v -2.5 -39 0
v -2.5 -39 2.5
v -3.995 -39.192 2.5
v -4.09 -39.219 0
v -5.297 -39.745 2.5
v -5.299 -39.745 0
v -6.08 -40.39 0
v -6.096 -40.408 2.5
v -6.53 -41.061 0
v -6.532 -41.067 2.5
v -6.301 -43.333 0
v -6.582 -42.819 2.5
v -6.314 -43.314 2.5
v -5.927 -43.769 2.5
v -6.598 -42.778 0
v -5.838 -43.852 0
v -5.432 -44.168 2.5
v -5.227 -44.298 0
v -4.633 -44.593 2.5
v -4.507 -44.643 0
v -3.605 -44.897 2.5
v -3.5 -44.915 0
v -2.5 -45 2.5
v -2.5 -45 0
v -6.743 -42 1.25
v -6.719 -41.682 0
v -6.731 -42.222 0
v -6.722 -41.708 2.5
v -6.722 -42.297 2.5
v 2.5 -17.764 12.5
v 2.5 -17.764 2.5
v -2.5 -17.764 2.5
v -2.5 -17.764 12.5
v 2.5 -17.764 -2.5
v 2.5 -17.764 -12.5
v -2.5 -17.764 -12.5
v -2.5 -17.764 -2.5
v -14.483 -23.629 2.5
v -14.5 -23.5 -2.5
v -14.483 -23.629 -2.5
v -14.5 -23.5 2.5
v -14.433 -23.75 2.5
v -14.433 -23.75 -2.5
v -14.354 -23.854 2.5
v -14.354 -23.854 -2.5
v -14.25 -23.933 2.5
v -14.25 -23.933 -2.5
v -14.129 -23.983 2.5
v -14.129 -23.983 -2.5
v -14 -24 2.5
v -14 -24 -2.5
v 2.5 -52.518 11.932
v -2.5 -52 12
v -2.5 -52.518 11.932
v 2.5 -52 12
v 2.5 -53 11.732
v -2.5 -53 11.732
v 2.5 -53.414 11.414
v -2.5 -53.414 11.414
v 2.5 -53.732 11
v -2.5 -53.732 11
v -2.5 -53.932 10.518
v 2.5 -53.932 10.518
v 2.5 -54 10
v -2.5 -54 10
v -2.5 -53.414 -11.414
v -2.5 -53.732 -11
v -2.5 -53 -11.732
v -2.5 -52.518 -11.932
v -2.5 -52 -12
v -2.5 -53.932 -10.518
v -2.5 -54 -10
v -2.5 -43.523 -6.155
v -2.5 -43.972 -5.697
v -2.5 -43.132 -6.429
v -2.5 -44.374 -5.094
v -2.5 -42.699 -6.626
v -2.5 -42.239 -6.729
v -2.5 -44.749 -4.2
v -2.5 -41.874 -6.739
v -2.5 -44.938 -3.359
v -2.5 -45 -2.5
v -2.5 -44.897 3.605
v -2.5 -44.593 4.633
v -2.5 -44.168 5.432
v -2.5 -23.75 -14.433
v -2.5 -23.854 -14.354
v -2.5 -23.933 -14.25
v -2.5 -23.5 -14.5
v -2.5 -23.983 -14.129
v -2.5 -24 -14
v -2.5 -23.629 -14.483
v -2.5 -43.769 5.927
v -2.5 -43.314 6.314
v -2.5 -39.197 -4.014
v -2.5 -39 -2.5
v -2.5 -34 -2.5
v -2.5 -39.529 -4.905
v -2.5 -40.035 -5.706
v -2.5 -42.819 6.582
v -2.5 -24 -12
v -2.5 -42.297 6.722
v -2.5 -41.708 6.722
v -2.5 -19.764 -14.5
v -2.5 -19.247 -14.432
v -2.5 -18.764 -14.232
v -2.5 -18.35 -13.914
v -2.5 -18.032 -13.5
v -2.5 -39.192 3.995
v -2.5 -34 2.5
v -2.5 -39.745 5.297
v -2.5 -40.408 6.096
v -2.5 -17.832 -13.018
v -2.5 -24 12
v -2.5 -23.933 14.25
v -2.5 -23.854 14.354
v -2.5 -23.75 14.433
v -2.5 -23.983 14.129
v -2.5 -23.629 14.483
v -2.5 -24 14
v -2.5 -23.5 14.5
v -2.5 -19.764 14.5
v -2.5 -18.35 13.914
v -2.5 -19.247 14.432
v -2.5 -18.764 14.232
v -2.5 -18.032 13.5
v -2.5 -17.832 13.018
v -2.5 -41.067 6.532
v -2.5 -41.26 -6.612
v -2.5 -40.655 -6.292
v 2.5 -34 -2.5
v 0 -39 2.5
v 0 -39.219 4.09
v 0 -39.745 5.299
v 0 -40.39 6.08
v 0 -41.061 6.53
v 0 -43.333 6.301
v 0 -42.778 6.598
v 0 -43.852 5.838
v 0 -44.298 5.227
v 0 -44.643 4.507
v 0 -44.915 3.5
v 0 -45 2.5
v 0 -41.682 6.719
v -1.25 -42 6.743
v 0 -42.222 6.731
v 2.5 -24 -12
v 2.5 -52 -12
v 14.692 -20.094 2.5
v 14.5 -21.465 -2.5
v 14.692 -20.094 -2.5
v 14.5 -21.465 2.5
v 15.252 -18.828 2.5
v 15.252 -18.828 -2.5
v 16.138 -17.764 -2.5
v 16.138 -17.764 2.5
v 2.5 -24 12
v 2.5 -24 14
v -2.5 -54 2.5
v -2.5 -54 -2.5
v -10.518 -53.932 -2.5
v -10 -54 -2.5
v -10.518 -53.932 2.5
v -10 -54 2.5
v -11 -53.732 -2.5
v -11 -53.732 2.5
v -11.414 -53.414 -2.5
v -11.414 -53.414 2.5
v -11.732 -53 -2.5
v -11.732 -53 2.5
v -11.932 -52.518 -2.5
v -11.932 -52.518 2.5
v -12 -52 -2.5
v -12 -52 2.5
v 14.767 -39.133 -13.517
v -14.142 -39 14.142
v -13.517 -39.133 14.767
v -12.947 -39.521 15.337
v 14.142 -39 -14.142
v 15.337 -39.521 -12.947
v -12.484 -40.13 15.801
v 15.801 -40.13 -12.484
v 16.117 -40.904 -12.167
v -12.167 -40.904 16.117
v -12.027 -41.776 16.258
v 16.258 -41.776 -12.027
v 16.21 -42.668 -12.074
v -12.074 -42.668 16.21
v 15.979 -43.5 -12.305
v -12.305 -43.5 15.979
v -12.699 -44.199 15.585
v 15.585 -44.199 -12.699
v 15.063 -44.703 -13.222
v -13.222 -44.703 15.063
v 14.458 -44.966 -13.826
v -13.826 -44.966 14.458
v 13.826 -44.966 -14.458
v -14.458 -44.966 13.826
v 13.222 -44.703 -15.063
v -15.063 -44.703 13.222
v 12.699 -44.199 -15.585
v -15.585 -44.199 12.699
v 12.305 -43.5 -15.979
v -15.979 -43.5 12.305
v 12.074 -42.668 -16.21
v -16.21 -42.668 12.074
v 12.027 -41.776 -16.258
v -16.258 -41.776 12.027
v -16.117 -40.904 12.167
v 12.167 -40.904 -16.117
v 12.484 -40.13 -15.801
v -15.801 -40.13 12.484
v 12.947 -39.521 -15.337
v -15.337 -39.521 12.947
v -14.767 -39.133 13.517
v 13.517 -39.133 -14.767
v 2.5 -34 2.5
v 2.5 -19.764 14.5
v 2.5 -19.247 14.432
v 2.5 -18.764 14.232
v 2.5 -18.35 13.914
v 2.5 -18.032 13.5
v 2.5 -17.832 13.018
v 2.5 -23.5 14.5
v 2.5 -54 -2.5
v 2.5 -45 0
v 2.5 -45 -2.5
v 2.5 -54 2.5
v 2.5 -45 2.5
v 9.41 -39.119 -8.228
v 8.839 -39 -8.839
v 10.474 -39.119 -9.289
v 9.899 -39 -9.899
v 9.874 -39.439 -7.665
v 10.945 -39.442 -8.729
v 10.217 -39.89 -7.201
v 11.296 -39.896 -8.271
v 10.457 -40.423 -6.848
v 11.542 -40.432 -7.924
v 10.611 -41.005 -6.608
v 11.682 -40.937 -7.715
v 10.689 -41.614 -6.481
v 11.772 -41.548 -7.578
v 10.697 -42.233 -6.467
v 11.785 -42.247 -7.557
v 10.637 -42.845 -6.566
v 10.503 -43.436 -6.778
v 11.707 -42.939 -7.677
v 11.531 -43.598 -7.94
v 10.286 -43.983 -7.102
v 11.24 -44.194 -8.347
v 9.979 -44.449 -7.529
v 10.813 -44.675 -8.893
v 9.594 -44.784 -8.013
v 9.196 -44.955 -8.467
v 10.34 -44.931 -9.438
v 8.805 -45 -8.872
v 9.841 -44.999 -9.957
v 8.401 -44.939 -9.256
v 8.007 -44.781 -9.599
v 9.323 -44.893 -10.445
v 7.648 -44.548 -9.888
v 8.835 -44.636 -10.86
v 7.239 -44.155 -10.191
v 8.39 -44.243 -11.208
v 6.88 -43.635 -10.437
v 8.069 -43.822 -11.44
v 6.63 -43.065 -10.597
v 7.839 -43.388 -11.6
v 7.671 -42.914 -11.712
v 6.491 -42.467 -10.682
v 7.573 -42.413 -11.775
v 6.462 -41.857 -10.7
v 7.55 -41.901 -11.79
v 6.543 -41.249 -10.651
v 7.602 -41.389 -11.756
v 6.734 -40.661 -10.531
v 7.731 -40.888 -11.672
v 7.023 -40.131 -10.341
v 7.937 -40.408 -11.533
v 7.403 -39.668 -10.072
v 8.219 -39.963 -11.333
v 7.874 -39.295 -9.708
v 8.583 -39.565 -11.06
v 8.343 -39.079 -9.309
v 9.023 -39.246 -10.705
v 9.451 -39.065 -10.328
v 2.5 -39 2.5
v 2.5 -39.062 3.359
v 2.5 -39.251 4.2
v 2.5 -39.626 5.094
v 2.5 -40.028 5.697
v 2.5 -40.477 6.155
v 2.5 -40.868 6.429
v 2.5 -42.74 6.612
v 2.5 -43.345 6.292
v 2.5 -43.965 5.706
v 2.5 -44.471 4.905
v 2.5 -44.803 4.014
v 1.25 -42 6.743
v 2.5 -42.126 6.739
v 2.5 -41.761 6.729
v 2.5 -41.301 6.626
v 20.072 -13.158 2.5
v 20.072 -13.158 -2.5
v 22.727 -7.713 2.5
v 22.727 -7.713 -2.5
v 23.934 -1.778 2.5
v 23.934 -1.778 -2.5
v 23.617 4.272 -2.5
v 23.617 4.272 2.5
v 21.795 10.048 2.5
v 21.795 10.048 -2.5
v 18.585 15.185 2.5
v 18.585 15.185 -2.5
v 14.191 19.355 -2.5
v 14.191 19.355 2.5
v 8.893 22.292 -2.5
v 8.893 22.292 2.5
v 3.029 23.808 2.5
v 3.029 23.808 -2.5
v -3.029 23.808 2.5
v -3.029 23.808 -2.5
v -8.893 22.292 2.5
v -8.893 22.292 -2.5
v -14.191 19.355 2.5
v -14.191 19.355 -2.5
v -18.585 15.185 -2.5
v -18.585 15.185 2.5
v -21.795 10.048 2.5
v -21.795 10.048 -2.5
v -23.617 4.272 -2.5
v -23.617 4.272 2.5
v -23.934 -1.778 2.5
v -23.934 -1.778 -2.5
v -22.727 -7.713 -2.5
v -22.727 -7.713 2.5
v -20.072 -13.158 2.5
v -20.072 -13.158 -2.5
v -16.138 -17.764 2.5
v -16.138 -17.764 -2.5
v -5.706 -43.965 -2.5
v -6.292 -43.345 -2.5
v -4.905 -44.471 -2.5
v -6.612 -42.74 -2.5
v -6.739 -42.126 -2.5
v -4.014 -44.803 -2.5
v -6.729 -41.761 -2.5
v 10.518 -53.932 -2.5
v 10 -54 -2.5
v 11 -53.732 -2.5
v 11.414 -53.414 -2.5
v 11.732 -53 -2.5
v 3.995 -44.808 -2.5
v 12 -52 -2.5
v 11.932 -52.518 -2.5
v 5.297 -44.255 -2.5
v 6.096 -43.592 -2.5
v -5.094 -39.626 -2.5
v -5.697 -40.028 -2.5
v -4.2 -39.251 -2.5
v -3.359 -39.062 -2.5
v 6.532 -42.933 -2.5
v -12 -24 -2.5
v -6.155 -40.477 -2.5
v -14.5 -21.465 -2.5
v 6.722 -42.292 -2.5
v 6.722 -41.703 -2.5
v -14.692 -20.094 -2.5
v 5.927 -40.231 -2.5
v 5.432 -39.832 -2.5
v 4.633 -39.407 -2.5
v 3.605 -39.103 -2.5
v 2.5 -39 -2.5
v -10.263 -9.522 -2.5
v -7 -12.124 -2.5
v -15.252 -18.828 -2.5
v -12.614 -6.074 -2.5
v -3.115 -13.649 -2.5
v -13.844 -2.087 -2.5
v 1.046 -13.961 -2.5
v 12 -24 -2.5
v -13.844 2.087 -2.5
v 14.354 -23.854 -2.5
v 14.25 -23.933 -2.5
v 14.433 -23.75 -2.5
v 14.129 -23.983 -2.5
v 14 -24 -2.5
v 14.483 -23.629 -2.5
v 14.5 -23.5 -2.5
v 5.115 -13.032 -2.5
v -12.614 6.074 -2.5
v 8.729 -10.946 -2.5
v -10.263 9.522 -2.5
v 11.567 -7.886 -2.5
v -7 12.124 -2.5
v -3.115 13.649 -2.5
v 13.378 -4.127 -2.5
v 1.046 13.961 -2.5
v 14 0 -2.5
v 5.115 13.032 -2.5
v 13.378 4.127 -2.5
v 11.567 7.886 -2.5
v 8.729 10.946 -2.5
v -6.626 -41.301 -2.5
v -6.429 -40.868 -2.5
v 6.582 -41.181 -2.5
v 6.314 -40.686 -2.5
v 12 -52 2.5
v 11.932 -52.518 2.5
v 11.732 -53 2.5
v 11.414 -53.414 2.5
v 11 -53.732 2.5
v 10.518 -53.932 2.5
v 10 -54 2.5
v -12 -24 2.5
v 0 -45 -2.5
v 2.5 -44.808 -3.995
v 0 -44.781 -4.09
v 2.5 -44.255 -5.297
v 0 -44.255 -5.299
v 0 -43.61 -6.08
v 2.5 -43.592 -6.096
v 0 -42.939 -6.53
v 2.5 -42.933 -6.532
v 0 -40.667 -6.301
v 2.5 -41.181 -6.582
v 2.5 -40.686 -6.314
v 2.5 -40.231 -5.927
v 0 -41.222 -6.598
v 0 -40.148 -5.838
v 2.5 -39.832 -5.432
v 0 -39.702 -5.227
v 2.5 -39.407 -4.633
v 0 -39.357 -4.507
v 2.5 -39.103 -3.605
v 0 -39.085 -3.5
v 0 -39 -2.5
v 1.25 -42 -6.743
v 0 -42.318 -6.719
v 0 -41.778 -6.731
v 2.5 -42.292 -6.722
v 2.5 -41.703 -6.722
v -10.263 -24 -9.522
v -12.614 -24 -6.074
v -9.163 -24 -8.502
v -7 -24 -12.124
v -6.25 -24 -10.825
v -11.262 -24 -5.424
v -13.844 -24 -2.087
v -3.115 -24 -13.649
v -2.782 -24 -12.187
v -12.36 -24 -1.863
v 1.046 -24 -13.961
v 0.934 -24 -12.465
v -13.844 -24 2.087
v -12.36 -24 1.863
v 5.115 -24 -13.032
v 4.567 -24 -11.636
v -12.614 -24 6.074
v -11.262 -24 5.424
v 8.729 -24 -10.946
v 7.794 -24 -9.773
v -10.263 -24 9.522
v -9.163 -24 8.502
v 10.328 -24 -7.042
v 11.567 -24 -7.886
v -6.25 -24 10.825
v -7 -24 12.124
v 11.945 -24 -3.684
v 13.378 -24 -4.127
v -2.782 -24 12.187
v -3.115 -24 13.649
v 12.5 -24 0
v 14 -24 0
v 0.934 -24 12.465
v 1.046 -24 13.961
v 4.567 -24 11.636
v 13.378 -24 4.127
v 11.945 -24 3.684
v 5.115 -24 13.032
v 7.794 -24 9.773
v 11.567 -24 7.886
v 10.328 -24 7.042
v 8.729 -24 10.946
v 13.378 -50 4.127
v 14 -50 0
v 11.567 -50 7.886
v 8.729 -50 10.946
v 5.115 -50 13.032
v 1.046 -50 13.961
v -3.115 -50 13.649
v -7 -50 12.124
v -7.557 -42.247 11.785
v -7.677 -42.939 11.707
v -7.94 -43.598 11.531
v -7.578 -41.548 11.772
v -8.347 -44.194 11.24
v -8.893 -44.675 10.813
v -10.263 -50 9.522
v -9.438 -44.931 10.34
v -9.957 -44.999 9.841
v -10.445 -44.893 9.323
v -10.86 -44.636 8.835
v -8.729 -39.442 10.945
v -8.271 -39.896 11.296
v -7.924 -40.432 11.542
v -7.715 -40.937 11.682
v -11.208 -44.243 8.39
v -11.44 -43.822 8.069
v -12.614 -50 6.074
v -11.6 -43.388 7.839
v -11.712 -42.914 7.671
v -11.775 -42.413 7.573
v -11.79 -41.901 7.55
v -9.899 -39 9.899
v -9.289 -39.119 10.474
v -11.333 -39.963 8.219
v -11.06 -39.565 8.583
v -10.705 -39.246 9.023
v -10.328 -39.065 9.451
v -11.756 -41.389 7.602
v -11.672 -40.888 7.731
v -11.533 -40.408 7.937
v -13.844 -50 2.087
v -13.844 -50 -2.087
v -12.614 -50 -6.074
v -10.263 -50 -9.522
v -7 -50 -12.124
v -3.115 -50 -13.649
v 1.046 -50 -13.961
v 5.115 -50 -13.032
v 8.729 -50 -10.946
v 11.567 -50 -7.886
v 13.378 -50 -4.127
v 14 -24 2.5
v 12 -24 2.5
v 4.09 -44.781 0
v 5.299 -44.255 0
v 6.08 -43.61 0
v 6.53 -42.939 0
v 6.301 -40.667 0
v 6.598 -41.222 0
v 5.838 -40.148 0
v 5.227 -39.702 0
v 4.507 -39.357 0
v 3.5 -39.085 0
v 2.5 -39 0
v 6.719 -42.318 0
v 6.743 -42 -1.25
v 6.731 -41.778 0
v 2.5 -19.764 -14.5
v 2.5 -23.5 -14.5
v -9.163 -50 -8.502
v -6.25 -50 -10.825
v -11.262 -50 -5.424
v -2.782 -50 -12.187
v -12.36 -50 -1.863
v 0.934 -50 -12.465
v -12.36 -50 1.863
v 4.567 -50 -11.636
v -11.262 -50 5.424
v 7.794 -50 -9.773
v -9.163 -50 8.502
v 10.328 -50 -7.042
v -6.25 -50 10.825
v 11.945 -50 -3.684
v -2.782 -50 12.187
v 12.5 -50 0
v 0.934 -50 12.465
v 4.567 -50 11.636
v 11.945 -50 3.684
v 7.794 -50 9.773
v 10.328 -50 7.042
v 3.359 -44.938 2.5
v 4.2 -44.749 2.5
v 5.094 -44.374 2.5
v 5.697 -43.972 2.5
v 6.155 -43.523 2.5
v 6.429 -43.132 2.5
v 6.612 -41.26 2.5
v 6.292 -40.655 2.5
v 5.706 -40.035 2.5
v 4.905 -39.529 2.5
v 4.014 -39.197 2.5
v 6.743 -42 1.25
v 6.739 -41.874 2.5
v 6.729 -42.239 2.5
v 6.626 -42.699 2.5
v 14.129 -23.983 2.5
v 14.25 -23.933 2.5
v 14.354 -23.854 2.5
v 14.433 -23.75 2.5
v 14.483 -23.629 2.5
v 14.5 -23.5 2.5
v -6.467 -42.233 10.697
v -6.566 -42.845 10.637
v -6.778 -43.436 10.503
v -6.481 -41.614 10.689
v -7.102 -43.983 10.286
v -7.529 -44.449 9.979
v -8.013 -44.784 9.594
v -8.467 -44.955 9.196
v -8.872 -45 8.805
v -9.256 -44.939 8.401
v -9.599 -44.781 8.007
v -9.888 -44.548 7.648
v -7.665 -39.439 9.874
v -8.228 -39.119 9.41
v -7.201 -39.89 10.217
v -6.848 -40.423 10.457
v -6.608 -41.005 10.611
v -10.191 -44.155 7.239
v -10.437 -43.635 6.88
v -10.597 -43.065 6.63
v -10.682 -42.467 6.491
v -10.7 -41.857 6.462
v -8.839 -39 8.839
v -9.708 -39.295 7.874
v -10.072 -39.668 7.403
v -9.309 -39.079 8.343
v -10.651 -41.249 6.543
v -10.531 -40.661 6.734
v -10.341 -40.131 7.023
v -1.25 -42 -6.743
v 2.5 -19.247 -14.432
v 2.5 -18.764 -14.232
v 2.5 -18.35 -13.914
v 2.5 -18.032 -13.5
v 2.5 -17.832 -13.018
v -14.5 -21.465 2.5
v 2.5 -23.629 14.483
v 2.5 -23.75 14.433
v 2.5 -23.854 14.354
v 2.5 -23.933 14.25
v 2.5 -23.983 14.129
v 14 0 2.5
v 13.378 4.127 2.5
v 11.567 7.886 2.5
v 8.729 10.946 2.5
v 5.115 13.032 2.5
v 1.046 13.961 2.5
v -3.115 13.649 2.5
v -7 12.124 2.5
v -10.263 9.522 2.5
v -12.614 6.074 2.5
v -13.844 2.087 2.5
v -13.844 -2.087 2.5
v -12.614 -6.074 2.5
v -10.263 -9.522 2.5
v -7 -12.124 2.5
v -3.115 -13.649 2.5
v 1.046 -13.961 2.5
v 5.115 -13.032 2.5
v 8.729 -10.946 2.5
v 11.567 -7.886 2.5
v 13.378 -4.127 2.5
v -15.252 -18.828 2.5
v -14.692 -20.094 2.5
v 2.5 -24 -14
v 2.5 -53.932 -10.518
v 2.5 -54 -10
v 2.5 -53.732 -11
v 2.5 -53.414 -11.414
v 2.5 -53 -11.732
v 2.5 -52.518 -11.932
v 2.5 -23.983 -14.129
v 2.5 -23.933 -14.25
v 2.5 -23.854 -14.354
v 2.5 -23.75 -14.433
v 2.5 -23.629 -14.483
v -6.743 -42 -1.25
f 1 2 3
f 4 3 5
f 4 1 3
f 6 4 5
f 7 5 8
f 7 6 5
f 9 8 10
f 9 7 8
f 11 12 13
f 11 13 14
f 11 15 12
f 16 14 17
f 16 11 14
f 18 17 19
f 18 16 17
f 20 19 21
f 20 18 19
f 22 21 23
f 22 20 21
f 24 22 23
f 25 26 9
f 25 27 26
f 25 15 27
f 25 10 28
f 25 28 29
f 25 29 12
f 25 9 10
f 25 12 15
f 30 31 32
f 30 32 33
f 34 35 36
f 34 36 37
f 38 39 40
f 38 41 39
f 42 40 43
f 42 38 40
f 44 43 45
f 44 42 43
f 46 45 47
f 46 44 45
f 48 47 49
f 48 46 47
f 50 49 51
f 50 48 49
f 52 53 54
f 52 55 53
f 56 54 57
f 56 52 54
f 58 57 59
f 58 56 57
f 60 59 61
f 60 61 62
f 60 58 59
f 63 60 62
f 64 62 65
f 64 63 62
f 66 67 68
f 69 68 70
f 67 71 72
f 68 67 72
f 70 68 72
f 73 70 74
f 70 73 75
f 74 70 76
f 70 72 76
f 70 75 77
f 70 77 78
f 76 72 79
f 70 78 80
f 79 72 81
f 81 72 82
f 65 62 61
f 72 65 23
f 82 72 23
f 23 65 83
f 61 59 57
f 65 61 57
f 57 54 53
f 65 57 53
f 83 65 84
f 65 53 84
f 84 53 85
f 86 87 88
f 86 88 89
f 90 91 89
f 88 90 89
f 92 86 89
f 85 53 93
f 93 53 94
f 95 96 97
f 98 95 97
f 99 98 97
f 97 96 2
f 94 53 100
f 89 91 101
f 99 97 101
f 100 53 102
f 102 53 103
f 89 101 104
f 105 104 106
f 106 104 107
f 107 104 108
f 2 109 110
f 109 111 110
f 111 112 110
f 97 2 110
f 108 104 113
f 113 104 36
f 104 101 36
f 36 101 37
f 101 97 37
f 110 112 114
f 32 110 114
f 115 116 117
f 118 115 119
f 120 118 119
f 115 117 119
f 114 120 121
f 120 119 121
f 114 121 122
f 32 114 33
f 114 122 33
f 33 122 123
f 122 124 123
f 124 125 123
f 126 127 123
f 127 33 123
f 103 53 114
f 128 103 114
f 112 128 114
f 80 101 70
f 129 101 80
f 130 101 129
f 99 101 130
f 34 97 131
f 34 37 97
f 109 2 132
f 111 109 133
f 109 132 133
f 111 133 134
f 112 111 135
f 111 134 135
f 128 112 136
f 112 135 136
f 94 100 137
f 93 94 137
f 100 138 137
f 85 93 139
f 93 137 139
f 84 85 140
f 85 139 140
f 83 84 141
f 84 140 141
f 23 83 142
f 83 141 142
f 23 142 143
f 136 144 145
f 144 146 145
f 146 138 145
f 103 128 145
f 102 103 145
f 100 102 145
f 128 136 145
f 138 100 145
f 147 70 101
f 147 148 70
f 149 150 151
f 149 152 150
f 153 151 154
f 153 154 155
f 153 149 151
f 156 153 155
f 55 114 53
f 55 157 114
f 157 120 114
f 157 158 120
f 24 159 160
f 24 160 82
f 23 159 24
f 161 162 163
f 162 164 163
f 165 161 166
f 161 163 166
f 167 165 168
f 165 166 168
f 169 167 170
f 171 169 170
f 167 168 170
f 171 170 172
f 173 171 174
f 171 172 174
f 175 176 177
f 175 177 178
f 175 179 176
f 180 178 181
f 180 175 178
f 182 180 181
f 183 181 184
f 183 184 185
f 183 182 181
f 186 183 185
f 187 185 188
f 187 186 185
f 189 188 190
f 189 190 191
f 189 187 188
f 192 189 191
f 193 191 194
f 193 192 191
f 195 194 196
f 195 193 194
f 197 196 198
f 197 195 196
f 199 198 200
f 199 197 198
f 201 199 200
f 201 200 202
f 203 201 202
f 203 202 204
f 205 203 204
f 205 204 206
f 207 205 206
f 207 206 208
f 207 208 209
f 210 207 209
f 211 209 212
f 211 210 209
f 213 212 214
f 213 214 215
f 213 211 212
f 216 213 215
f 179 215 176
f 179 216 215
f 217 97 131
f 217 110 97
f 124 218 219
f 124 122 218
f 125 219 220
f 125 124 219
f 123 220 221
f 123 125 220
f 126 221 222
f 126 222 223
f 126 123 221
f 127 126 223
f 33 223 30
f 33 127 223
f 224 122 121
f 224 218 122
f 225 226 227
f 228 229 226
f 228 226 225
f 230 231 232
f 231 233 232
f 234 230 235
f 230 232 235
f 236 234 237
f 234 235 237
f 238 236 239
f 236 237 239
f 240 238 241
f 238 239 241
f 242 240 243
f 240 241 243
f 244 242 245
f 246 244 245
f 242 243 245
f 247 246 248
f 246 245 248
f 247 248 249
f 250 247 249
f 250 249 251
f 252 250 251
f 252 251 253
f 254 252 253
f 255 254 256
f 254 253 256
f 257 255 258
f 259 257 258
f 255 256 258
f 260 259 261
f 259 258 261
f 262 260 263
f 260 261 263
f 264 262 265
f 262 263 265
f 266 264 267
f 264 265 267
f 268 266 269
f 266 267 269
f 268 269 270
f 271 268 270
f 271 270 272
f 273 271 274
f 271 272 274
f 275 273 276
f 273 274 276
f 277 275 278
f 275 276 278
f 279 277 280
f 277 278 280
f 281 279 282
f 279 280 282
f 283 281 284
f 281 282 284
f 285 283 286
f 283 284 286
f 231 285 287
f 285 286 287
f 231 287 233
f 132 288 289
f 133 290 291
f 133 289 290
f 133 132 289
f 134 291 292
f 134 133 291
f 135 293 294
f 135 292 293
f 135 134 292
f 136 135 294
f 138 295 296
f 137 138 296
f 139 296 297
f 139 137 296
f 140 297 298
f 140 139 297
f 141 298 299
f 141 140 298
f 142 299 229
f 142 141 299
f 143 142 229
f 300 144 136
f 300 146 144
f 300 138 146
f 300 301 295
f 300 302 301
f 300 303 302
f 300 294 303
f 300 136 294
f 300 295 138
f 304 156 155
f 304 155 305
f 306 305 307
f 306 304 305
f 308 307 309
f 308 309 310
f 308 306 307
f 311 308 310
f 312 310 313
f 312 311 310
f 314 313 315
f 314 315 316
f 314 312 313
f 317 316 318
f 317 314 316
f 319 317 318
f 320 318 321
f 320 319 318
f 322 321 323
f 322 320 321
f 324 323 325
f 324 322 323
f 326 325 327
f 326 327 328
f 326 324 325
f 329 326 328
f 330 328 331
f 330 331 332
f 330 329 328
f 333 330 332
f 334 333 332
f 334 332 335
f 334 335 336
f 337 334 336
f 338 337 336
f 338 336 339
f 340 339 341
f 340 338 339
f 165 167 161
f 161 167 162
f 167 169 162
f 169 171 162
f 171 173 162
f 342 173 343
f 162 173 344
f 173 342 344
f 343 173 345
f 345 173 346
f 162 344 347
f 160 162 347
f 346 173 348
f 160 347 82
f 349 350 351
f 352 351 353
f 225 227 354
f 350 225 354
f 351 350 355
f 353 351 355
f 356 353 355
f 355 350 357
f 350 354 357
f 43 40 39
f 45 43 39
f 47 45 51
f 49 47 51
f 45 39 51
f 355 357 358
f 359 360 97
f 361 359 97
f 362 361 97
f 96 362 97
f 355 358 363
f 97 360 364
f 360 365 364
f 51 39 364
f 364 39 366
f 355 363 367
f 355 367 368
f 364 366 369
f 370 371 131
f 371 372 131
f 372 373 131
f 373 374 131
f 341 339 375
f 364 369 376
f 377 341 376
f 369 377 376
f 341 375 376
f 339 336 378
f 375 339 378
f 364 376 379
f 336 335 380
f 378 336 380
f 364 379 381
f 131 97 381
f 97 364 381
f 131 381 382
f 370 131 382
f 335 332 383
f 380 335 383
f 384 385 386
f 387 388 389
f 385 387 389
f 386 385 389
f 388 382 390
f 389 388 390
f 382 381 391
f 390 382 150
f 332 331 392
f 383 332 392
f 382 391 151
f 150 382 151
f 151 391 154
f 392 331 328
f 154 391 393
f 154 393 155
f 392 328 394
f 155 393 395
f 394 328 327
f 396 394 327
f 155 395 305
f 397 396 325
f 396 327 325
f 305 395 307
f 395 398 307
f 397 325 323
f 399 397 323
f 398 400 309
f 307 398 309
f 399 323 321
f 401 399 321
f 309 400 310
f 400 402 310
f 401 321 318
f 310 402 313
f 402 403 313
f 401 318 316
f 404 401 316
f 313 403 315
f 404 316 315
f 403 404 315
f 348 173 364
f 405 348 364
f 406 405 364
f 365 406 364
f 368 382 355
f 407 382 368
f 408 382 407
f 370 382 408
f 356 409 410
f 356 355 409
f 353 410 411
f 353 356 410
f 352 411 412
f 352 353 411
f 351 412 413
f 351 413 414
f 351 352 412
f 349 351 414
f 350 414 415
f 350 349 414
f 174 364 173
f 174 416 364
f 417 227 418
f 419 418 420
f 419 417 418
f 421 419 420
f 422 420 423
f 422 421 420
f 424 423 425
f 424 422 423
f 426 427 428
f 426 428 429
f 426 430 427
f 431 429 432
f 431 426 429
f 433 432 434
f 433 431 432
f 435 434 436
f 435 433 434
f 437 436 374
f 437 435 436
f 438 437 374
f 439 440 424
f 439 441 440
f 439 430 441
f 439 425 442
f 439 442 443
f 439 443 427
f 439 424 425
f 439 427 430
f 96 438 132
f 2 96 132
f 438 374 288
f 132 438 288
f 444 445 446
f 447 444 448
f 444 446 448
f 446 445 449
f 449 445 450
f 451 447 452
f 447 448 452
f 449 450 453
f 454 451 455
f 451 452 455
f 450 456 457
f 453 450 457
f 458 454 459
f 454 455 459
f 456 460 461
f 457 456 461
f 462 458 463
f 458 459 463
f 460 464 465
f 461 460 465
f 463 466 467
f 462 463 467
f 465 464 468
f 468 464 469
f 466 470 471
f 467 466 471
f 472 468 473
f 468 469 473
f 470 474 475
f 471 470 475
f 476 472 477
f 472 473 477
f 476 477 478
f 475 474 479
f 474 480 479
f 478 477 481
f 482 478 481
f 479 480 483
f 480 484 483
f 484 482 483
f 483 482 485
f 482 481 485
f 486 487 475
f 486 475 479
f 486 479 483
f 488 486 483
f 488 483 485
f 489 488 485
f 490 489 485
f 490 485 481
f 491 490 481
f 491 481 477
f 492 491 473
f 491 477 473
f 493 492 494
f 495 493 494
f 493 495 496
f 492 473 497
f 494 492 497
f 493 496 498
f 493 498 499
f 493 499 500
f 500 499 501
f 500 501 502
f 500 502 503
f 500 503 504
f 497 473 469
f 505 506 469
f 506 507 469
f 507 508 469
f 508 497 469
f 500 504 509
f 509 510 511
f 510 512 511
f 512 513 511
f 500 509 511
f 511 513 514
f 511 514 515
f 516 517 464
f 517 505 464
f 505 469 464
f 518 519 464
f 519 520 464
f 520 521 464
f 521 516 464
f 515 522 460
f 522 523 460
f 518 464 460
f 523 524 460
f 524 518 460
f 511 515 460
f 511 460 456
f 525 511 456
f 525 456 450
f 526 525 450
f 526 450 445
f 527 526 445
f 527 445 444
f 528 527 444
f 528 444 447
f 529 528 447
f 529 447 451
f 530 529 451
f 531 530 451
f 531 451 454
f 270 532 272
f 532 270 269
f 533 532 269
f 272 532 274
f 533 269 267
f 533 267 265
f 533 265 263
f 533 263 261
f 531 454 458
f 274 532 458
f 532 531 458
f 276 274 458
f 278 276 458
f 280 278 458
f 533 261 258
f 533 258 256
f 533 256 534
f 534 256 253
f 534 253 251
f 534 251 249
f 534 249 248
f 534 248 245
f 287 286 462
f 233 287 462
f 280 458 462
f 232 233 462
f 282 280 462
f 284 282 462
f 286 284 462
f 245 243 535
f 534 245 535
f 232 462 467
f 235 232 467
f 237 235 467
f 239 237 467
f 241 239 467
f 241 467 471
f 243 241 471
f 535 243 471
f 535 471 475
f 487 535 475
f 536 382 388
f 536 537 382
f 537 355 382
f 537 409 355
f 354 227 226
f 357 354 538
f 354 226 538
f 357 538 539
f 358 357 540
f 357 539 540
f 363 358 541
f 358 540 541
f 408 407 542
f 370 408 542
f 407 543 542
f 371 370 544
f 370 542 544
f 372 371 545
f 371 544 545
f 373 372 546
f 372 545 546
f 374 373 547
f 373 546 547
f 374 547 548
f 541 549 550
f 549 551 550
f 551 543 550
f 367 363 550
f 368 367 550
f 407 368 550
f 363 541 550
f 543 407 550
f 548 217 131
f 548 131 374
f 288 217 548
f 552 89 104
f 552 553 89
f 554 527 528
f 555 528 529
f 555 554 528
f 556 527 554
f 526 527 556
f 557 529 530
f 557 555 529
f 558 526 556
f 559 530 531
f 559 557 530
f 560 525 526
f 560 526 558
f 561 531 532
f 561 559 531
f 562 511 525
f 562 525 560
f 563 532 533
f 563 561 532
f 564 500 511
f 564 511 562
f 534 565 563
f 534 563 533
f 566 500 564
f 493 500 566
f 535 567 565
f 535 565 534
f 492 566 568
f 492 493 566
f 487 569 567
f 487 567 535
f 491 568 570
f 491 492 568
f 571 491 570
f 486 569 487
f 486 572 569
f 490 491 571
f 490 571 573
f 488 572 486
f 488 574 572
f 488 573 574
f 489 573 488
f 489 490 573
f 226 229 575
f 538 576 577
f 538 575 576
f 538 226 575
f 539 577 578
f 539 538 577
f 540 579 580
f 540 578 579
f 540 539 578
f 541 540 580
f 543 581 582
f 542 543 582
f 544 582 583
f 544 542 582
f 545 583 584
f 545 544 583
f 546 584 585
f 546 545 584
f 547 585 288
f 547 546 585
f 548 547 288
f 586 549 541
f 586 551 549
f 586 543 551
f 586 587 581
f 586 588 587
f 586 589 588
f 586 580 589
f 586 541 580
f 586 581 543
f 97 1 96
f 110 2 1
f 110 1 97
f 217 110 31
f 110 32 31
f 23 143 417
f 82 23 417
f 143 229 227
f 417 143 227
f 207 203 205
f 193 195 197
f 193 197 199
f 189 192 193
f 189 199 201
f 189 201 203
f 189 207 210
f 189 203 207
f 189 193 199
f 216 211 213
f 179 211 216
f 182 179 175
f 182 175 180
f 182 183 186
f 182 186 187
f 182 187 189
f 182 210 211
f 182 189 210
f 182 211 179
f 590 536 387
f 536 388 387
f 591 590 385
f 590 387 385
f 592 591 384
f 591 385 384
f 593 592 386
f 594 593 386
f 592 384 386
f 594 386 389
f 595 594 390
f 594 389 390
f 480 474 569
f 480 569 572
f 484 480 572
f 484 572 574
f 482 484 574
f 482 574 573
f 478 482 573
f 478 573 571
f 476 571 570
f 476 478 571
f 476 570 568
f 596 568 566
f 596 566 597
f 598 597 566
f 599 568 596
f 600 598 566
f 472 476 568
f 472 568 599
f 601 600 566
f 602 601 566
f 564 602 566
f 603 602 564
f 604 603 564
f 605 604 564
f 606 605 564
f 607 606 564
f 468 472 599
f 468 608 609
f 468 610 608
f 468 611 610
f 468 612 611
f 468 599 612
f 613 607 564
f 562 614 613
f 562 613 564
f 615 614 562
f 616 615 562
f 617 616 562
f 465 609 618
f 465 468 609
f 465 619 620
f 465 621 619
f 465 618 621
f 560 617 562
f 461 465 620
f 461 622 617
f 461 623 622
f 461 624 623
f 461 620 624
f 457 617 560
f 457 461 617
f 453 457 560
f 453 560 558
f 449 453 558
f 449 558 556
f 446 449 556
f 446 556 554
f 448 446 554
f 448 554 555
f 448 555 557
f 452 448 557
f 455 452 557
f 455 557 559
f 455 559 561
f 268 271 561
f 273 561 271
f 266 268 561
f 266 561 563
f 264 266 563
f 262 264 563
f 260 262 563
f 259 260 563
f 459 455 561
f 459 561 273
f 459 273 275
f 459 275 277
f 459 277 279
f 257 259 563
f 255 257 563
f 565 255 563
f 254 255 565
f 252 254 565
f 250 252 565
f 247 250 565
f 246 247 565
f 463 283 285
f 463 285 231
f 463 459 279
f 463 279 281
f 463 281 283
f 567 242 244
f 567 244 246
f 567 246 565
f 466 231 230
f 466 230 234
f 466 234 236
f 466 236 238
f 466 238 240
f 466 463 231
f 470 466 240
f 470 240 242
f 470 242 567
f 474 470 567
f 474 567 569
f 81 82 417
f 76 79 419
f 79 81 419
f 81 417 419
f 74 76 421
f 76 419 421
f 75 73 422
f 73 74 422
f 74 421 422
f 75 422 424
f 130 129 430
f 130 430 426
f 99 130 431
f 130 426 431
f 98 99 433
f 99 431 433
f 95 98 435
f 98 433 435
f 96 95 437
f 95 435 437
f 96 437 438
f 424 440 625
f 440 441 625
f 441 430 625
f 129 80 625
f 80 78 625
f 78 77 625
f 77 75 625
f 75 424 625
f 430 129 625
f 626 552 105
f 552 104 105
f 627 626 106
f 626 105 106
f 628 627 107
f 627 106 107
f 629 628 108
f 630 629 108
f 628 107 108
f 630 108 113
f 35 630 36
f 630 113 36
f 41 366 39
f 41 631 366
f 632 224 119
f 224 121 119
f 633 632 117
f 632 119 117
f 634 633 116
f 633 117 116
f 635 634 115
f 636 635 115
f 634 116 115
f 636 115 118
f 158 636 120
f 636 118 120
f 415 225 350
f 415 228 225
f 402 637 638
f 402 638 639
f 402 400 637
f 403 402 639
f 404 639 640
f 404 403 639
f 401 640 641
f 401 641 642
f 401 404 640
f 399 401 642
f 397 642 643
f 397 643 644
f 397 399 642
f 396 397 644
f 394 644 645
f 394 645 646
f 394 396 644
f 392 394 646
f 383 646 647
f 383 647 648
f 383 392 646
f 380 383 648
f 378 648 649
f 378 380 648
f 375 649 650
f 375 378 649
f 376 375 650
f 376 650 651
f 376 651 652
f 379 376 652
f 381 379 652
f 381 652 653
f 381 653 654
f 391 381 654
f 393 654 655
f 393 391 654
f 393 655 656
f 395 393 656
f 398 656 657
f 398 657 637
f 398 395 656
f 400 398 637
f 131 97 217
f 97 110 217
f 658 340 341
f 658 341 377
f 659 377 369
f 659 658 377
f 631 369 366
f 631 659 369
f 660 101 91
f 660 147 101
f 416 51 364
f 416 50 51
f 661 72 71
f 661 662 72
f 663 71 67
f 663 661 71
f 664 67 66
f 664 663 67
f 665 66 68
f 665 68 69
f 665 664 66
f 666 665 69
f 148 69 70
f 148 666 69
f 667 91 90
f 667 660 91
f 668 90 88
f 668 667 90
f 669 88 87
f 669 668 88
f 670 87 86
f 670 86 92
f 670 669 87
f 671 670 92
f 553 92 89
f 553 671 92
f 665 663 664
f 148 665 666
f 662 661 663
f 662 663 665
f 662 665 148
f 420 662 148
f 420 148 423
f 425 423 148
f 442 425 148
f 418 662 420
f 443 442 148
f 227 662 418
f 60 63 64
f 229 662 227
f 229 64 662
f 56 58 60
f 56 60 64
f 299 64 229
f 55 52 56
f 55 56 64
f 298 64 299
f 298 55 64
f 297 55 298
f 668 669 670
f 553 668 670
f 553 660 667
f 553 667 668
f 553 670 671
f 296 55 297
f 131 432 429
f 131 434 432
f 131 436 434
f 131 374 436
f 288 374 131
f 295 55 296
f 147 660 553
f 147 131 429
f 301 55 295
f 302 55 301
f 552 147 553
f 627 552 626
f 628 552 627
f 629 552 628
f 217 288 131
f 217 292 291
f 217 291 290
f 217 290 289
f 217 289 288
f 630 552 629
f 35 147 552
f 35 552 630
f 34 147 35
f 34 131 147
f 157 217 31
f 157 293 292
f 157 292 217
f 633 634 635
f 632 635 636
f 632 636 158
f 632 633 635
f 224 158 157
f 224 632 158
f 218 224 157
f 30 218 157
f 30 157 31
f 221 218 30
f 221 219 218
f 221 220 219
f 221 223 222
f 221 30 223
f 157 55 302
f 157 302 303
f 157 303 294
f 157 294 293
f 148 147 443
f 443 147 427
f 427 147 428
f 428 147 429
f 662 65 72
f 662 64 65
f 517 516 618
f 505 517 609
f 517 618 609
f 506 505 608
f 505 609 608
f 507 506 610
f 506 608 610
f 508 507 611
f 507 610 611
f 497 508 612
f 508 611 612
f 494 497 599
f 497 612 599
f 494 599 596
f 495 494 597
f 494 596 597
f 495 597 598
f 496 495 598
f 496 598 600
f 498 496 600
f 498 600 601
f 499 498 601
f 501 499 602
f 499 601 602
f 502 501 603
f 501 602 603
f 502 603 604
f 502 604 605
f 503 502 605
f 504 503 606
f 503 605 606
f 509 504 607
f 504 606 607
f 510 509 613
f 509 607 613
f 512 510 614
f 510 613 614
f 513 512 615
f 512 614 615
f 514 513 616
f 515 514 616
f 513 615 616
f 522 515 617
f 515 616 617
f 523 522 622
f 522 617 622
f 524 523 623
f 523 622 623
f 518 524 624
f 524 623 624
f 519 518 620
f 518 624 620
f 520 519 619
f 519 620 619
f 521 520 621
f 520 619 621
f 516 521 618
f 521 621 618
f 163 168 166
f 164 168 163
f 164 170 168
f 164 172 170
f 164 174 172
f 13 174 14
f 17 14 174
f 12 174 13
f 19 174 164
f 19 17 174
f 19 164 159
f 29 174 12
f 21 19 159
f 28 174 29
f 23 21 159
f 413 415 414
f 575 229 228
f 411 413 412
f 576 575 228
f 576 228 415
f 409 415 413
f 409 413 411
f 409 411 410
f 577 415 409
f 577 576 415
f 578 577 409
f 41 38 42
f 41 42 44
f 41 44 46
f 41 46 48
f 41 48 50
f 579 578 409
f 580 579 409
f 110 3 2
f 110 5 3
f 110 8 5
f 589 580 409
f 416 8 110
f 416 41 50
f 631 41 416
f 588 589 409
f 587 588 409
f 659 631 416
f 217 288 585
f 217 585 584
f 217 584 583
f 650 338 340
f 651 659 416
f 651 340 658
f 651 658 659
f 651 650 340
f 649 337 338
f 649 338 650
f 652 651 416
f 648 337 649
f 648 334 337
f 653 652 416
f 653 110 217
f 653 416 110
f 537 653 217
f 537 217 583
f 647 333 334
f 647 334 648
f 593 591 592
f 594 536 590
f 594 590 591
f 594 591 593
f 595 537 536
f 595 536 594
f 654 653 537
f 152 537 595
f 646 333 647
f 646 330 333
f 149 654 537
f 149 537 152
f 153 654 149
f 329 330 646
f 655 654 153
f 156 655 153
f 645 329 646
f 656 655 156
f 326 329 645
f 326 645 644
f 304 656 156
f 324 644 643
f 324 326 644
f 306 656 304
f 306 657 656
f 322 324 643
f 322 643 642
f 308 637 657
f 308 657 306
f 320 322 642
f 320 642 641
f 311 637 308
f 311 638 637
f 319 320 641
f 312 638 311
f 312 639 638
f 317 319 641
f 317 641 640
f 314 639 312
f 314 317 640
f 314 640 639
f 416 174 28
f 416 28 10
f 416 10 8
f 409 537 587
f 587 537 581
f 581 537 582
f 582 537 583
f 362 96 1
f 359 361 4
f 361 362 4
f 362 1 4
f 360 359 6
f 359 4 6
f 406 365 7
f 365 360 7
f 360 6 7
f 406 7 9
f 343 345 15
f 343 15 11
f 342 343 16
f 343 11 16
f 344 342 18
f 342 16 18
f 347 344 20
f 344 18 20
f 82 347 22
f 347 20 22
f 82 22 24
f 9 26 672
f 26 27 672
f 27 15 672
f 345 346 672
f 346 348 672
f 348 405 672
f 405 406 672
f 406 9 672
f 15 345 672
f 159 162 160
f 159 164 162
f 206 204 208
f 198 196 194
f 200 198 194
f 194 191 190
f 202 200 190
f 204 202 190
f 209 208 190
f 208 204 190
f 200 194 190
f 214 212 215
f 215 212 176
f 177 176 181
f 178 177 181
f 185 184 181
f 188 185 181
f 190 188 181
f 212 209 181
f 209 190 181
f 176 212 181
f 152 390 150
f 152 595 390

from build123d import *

# Parameters (mm, degrees)
F0_R      = 14
F1_DEPTH  = 2.5
F3_DEPTH  = 2.5
F6_START  = 24
F5_R      = 14
F5_R_2    = 12.5
F6_DEPTH  = 26
F8_R      = 3
F9_DEPTH  = 20
F13_DEPTH = 12.5
F16_DEPTH = 12.5
F17_R     = 2
F17_2_R   = 2
F18_R     = 2
F19_R     = 0.5
F19_2_R   = 0.5


with BuildPart() as f1:
    # F0 (on Top) → F1 (new body, symmetric)
    with BuildSketch(Plane.XY):
        with BuildLine():
            ThreePointArc((14.5, -21.4650879337), (14.9277825496, -19.4415199002), (16.1379310345, -17.7642107037))
            ThreePointArc((16.1379310345, -17.7642107037), (0, 24), (-16.1379310345, -17.7642107037))
            ThreePointArc((-16.1379310345, -17.7642107037), (-14.9277825496, -19.4415199002), (-14.5, -21.4650879337))
            Line((-14.5, -21.4650879337), (-14.5, -24))
            Line((-14.5, -24), (-12, -24))
            Line((-12, -24), (-12, -54))
            Line((-12, -54), (-2.5, -54))
            Line((-2.5, -54), (-2.5, -34))
            Line((-2.5, -34), (2.5, -34))
            Line((2.5, -34), (2.5, -54))
            Line((2.5, -54), (12, -54))
            Line((12, -54), (12, -24))
            Line((12, -24), (14.5, -24))
            Line((14.5, -24), (14.5, -21.4650879337))
        make_face()
        Circle(F0_R, mode=Mode.SUBTRACT)
    extrude(amount=F1_DEPTH, both=True)


with BuildPart() as f3:
    # F2 (on Right) → F3 (new body, symmetric)
    with BuildSketch(Plane.YZ):
        Polygon((-24, 14.5), (-24, 12), (-54, 12), (-54, -12), (-24, -12), (-24, -14.5), (-17.7642107037, -14.5), (-17.7642107037, 14.5), align=None)
    extrude(amount=F3_DEPTH, both=True)

    # F4: cut F1
    add(f1.part, mode=Mode.SUBTRACT)


with BuildPart() as f6:
    # F5 (on Front) → F6 (new body)
    with BuildSketch(Plane.XZ.offset(F6_START)):
        Circle(F5_R)
        Circle(F5_R_2, mode=Mode.SUBTRACT)
    extrude(amount=F6_DEPTH)


with BuildPart() as f9:
    # F8 (on face) → F9 (new body, symmetric)
    with BuildSketch(Plane(origin=(0, 0, 0), x_dir=(0, 1, 0), z_dir=(0.7071067812, 0, -0.7071067812))):
        with Locations((-42, 0)):
            Circle(F8_R)
    extrude(amount=F9_DEPTH, both=True)


with BuildPart() as f6_1:
    add(f6.part)

    # F10: cut F9
    add(f9.part, mode=Mode.SUBTRACT)


with BuildPart() as f3_1:
    add(f3.part)

    # F11: cut F9
    add(f9.part, mode=Mode.SUBTRACT)

    # F15 (on Right) → F16 (cut, symmetric)
    with BuildSketch(Plane.YZ):
        with BuildLine():
            Line((-45, 2.5), (-45, -2.5))
            add(Edge.make_bspline(
                [(-45, -2.5), (-45, -6.7426406871), (-42, -6.7426406871), (-39, -6.7426406871), (-39, -2.5)],
                knots=[1.5707963268, 1.5707963268, 1.5707963268, 3.1415926536, 3.1415926536, 4.7123889804, 4.7123889804, 4.7123889804], degree=2, weights=[1, 0.7071067812, 1, 0.7071067812, 1]))
            Line((-39, -2.5), (-39, 2.5))
            add(Edge.make_bspline(
                [(-39, 2.5), (-39, 6.7426406871), (-42, 6.7426406871), (-45, 6.7426406871), (-45, 2.5)],
                knots=[1.5707963268, 1.5707963268, 1.5707963268, 3.1415926536, 3.1415926536, 4.7123889804, 4.7123889804, 4.7123889804], degree=2, weights=[1, 0.7071067812, 1, 0.7071067812, 1]))
        make_face()
    extrude(amount=F16_DEPTH, both=True, mode=Mode.SUBTRACT)

    # F17#2
    f17_2_edges = [f3_1.edges().sort_by_distance(p)[0] for p in [
        (0, -54, 12),
        (0, -54, -12),
    ]]
    fillet(f17_2_edges, radius=F17_2_R)

    # F18
    f18_edges = [f3_1.edges().sort_by_distance(p)[0] for p in [
        (0, -17.764211, -14.5),
        (0, -17.764211, 14.5),
    ]]
    fillet(f18_edges, radius=F18_R)

    # F19#2
    f19_2_edges = [f3_1.edges().sort_by_distance(p)[0] for p in [
        (0, -24, 14.5),
        (0, -24, -14.5),
    ]]
    fillet(f19_2_edges, radius=F19_2_R)


with BuildPart() as f1_1:
    add(f1.part)

    # F11: cut F9
    add(f9.part, mode=Mode.SUBTRACT)


with BuildPart() as f13:
    # F12 (on Top) → F13 (new body, symmetric)
    with BuildSketch(Plane.XY):
        with BuildLine():
            Line((2.5, -39), (-2.5, -39))
            add(Edge.make_bspline(
                [(-2.5, -39), (-6.7426406871, -39), (-6.7426406871, -42), (-6.7426406871, -45), (-2.5, -45)],
                knots=[4.7123889804, 4.7123889804, 4.7123889804, 6.2831853072, 6.2831853072, 7.853981634, 7.853981634, 7.853981634], degree=2, weights=[1, 0.7071067812, 1, 0.7071067812, 1]))
            Line((-2.5, -45), (2.5, -45))
            add(Edge.make_bspline(
                [(2.5, -45), (6.7426406871, -45), (6.7426406871, -42), (6.7426406871, -39), (2.5, -39)],
                knots=[4.7123889804, 4.7123889804, 4.7123889804, 6.2831853072, 6.2831853072, 7.853981634, 7.853981634, 7.853981634], degree=2, weights=[1, 0.7071067812, 1, 0.7071067812, 1]))
        make_face()
    extrude(amount=F13_DEPTH, both=True)


with BuildPart() as f1_2:
    add(f1_1.part)

    # F14: cut F13
    add(f13.part, mode=Mode.SUBTRACT)

    # F17
    f17_edges = [f1_2.edges().sort_by_distance(p)[0] for p in [
        (12, -54, 0),
        (-12, -54, 0),
    ]]
    fillet(f17_edges, radius=F17_R)

    # F19
    f19_edges = [f1_2.edges().sort_by_distance(p)[0] for p in [
        (14.5, -24, 0),
        (-14.5, -24, 0),
    ]]
    fillet(f19_edges, radius=F19_R)


solid = Compound([f9.part, f6_1.part, f3_1.part, f1_2.part])
